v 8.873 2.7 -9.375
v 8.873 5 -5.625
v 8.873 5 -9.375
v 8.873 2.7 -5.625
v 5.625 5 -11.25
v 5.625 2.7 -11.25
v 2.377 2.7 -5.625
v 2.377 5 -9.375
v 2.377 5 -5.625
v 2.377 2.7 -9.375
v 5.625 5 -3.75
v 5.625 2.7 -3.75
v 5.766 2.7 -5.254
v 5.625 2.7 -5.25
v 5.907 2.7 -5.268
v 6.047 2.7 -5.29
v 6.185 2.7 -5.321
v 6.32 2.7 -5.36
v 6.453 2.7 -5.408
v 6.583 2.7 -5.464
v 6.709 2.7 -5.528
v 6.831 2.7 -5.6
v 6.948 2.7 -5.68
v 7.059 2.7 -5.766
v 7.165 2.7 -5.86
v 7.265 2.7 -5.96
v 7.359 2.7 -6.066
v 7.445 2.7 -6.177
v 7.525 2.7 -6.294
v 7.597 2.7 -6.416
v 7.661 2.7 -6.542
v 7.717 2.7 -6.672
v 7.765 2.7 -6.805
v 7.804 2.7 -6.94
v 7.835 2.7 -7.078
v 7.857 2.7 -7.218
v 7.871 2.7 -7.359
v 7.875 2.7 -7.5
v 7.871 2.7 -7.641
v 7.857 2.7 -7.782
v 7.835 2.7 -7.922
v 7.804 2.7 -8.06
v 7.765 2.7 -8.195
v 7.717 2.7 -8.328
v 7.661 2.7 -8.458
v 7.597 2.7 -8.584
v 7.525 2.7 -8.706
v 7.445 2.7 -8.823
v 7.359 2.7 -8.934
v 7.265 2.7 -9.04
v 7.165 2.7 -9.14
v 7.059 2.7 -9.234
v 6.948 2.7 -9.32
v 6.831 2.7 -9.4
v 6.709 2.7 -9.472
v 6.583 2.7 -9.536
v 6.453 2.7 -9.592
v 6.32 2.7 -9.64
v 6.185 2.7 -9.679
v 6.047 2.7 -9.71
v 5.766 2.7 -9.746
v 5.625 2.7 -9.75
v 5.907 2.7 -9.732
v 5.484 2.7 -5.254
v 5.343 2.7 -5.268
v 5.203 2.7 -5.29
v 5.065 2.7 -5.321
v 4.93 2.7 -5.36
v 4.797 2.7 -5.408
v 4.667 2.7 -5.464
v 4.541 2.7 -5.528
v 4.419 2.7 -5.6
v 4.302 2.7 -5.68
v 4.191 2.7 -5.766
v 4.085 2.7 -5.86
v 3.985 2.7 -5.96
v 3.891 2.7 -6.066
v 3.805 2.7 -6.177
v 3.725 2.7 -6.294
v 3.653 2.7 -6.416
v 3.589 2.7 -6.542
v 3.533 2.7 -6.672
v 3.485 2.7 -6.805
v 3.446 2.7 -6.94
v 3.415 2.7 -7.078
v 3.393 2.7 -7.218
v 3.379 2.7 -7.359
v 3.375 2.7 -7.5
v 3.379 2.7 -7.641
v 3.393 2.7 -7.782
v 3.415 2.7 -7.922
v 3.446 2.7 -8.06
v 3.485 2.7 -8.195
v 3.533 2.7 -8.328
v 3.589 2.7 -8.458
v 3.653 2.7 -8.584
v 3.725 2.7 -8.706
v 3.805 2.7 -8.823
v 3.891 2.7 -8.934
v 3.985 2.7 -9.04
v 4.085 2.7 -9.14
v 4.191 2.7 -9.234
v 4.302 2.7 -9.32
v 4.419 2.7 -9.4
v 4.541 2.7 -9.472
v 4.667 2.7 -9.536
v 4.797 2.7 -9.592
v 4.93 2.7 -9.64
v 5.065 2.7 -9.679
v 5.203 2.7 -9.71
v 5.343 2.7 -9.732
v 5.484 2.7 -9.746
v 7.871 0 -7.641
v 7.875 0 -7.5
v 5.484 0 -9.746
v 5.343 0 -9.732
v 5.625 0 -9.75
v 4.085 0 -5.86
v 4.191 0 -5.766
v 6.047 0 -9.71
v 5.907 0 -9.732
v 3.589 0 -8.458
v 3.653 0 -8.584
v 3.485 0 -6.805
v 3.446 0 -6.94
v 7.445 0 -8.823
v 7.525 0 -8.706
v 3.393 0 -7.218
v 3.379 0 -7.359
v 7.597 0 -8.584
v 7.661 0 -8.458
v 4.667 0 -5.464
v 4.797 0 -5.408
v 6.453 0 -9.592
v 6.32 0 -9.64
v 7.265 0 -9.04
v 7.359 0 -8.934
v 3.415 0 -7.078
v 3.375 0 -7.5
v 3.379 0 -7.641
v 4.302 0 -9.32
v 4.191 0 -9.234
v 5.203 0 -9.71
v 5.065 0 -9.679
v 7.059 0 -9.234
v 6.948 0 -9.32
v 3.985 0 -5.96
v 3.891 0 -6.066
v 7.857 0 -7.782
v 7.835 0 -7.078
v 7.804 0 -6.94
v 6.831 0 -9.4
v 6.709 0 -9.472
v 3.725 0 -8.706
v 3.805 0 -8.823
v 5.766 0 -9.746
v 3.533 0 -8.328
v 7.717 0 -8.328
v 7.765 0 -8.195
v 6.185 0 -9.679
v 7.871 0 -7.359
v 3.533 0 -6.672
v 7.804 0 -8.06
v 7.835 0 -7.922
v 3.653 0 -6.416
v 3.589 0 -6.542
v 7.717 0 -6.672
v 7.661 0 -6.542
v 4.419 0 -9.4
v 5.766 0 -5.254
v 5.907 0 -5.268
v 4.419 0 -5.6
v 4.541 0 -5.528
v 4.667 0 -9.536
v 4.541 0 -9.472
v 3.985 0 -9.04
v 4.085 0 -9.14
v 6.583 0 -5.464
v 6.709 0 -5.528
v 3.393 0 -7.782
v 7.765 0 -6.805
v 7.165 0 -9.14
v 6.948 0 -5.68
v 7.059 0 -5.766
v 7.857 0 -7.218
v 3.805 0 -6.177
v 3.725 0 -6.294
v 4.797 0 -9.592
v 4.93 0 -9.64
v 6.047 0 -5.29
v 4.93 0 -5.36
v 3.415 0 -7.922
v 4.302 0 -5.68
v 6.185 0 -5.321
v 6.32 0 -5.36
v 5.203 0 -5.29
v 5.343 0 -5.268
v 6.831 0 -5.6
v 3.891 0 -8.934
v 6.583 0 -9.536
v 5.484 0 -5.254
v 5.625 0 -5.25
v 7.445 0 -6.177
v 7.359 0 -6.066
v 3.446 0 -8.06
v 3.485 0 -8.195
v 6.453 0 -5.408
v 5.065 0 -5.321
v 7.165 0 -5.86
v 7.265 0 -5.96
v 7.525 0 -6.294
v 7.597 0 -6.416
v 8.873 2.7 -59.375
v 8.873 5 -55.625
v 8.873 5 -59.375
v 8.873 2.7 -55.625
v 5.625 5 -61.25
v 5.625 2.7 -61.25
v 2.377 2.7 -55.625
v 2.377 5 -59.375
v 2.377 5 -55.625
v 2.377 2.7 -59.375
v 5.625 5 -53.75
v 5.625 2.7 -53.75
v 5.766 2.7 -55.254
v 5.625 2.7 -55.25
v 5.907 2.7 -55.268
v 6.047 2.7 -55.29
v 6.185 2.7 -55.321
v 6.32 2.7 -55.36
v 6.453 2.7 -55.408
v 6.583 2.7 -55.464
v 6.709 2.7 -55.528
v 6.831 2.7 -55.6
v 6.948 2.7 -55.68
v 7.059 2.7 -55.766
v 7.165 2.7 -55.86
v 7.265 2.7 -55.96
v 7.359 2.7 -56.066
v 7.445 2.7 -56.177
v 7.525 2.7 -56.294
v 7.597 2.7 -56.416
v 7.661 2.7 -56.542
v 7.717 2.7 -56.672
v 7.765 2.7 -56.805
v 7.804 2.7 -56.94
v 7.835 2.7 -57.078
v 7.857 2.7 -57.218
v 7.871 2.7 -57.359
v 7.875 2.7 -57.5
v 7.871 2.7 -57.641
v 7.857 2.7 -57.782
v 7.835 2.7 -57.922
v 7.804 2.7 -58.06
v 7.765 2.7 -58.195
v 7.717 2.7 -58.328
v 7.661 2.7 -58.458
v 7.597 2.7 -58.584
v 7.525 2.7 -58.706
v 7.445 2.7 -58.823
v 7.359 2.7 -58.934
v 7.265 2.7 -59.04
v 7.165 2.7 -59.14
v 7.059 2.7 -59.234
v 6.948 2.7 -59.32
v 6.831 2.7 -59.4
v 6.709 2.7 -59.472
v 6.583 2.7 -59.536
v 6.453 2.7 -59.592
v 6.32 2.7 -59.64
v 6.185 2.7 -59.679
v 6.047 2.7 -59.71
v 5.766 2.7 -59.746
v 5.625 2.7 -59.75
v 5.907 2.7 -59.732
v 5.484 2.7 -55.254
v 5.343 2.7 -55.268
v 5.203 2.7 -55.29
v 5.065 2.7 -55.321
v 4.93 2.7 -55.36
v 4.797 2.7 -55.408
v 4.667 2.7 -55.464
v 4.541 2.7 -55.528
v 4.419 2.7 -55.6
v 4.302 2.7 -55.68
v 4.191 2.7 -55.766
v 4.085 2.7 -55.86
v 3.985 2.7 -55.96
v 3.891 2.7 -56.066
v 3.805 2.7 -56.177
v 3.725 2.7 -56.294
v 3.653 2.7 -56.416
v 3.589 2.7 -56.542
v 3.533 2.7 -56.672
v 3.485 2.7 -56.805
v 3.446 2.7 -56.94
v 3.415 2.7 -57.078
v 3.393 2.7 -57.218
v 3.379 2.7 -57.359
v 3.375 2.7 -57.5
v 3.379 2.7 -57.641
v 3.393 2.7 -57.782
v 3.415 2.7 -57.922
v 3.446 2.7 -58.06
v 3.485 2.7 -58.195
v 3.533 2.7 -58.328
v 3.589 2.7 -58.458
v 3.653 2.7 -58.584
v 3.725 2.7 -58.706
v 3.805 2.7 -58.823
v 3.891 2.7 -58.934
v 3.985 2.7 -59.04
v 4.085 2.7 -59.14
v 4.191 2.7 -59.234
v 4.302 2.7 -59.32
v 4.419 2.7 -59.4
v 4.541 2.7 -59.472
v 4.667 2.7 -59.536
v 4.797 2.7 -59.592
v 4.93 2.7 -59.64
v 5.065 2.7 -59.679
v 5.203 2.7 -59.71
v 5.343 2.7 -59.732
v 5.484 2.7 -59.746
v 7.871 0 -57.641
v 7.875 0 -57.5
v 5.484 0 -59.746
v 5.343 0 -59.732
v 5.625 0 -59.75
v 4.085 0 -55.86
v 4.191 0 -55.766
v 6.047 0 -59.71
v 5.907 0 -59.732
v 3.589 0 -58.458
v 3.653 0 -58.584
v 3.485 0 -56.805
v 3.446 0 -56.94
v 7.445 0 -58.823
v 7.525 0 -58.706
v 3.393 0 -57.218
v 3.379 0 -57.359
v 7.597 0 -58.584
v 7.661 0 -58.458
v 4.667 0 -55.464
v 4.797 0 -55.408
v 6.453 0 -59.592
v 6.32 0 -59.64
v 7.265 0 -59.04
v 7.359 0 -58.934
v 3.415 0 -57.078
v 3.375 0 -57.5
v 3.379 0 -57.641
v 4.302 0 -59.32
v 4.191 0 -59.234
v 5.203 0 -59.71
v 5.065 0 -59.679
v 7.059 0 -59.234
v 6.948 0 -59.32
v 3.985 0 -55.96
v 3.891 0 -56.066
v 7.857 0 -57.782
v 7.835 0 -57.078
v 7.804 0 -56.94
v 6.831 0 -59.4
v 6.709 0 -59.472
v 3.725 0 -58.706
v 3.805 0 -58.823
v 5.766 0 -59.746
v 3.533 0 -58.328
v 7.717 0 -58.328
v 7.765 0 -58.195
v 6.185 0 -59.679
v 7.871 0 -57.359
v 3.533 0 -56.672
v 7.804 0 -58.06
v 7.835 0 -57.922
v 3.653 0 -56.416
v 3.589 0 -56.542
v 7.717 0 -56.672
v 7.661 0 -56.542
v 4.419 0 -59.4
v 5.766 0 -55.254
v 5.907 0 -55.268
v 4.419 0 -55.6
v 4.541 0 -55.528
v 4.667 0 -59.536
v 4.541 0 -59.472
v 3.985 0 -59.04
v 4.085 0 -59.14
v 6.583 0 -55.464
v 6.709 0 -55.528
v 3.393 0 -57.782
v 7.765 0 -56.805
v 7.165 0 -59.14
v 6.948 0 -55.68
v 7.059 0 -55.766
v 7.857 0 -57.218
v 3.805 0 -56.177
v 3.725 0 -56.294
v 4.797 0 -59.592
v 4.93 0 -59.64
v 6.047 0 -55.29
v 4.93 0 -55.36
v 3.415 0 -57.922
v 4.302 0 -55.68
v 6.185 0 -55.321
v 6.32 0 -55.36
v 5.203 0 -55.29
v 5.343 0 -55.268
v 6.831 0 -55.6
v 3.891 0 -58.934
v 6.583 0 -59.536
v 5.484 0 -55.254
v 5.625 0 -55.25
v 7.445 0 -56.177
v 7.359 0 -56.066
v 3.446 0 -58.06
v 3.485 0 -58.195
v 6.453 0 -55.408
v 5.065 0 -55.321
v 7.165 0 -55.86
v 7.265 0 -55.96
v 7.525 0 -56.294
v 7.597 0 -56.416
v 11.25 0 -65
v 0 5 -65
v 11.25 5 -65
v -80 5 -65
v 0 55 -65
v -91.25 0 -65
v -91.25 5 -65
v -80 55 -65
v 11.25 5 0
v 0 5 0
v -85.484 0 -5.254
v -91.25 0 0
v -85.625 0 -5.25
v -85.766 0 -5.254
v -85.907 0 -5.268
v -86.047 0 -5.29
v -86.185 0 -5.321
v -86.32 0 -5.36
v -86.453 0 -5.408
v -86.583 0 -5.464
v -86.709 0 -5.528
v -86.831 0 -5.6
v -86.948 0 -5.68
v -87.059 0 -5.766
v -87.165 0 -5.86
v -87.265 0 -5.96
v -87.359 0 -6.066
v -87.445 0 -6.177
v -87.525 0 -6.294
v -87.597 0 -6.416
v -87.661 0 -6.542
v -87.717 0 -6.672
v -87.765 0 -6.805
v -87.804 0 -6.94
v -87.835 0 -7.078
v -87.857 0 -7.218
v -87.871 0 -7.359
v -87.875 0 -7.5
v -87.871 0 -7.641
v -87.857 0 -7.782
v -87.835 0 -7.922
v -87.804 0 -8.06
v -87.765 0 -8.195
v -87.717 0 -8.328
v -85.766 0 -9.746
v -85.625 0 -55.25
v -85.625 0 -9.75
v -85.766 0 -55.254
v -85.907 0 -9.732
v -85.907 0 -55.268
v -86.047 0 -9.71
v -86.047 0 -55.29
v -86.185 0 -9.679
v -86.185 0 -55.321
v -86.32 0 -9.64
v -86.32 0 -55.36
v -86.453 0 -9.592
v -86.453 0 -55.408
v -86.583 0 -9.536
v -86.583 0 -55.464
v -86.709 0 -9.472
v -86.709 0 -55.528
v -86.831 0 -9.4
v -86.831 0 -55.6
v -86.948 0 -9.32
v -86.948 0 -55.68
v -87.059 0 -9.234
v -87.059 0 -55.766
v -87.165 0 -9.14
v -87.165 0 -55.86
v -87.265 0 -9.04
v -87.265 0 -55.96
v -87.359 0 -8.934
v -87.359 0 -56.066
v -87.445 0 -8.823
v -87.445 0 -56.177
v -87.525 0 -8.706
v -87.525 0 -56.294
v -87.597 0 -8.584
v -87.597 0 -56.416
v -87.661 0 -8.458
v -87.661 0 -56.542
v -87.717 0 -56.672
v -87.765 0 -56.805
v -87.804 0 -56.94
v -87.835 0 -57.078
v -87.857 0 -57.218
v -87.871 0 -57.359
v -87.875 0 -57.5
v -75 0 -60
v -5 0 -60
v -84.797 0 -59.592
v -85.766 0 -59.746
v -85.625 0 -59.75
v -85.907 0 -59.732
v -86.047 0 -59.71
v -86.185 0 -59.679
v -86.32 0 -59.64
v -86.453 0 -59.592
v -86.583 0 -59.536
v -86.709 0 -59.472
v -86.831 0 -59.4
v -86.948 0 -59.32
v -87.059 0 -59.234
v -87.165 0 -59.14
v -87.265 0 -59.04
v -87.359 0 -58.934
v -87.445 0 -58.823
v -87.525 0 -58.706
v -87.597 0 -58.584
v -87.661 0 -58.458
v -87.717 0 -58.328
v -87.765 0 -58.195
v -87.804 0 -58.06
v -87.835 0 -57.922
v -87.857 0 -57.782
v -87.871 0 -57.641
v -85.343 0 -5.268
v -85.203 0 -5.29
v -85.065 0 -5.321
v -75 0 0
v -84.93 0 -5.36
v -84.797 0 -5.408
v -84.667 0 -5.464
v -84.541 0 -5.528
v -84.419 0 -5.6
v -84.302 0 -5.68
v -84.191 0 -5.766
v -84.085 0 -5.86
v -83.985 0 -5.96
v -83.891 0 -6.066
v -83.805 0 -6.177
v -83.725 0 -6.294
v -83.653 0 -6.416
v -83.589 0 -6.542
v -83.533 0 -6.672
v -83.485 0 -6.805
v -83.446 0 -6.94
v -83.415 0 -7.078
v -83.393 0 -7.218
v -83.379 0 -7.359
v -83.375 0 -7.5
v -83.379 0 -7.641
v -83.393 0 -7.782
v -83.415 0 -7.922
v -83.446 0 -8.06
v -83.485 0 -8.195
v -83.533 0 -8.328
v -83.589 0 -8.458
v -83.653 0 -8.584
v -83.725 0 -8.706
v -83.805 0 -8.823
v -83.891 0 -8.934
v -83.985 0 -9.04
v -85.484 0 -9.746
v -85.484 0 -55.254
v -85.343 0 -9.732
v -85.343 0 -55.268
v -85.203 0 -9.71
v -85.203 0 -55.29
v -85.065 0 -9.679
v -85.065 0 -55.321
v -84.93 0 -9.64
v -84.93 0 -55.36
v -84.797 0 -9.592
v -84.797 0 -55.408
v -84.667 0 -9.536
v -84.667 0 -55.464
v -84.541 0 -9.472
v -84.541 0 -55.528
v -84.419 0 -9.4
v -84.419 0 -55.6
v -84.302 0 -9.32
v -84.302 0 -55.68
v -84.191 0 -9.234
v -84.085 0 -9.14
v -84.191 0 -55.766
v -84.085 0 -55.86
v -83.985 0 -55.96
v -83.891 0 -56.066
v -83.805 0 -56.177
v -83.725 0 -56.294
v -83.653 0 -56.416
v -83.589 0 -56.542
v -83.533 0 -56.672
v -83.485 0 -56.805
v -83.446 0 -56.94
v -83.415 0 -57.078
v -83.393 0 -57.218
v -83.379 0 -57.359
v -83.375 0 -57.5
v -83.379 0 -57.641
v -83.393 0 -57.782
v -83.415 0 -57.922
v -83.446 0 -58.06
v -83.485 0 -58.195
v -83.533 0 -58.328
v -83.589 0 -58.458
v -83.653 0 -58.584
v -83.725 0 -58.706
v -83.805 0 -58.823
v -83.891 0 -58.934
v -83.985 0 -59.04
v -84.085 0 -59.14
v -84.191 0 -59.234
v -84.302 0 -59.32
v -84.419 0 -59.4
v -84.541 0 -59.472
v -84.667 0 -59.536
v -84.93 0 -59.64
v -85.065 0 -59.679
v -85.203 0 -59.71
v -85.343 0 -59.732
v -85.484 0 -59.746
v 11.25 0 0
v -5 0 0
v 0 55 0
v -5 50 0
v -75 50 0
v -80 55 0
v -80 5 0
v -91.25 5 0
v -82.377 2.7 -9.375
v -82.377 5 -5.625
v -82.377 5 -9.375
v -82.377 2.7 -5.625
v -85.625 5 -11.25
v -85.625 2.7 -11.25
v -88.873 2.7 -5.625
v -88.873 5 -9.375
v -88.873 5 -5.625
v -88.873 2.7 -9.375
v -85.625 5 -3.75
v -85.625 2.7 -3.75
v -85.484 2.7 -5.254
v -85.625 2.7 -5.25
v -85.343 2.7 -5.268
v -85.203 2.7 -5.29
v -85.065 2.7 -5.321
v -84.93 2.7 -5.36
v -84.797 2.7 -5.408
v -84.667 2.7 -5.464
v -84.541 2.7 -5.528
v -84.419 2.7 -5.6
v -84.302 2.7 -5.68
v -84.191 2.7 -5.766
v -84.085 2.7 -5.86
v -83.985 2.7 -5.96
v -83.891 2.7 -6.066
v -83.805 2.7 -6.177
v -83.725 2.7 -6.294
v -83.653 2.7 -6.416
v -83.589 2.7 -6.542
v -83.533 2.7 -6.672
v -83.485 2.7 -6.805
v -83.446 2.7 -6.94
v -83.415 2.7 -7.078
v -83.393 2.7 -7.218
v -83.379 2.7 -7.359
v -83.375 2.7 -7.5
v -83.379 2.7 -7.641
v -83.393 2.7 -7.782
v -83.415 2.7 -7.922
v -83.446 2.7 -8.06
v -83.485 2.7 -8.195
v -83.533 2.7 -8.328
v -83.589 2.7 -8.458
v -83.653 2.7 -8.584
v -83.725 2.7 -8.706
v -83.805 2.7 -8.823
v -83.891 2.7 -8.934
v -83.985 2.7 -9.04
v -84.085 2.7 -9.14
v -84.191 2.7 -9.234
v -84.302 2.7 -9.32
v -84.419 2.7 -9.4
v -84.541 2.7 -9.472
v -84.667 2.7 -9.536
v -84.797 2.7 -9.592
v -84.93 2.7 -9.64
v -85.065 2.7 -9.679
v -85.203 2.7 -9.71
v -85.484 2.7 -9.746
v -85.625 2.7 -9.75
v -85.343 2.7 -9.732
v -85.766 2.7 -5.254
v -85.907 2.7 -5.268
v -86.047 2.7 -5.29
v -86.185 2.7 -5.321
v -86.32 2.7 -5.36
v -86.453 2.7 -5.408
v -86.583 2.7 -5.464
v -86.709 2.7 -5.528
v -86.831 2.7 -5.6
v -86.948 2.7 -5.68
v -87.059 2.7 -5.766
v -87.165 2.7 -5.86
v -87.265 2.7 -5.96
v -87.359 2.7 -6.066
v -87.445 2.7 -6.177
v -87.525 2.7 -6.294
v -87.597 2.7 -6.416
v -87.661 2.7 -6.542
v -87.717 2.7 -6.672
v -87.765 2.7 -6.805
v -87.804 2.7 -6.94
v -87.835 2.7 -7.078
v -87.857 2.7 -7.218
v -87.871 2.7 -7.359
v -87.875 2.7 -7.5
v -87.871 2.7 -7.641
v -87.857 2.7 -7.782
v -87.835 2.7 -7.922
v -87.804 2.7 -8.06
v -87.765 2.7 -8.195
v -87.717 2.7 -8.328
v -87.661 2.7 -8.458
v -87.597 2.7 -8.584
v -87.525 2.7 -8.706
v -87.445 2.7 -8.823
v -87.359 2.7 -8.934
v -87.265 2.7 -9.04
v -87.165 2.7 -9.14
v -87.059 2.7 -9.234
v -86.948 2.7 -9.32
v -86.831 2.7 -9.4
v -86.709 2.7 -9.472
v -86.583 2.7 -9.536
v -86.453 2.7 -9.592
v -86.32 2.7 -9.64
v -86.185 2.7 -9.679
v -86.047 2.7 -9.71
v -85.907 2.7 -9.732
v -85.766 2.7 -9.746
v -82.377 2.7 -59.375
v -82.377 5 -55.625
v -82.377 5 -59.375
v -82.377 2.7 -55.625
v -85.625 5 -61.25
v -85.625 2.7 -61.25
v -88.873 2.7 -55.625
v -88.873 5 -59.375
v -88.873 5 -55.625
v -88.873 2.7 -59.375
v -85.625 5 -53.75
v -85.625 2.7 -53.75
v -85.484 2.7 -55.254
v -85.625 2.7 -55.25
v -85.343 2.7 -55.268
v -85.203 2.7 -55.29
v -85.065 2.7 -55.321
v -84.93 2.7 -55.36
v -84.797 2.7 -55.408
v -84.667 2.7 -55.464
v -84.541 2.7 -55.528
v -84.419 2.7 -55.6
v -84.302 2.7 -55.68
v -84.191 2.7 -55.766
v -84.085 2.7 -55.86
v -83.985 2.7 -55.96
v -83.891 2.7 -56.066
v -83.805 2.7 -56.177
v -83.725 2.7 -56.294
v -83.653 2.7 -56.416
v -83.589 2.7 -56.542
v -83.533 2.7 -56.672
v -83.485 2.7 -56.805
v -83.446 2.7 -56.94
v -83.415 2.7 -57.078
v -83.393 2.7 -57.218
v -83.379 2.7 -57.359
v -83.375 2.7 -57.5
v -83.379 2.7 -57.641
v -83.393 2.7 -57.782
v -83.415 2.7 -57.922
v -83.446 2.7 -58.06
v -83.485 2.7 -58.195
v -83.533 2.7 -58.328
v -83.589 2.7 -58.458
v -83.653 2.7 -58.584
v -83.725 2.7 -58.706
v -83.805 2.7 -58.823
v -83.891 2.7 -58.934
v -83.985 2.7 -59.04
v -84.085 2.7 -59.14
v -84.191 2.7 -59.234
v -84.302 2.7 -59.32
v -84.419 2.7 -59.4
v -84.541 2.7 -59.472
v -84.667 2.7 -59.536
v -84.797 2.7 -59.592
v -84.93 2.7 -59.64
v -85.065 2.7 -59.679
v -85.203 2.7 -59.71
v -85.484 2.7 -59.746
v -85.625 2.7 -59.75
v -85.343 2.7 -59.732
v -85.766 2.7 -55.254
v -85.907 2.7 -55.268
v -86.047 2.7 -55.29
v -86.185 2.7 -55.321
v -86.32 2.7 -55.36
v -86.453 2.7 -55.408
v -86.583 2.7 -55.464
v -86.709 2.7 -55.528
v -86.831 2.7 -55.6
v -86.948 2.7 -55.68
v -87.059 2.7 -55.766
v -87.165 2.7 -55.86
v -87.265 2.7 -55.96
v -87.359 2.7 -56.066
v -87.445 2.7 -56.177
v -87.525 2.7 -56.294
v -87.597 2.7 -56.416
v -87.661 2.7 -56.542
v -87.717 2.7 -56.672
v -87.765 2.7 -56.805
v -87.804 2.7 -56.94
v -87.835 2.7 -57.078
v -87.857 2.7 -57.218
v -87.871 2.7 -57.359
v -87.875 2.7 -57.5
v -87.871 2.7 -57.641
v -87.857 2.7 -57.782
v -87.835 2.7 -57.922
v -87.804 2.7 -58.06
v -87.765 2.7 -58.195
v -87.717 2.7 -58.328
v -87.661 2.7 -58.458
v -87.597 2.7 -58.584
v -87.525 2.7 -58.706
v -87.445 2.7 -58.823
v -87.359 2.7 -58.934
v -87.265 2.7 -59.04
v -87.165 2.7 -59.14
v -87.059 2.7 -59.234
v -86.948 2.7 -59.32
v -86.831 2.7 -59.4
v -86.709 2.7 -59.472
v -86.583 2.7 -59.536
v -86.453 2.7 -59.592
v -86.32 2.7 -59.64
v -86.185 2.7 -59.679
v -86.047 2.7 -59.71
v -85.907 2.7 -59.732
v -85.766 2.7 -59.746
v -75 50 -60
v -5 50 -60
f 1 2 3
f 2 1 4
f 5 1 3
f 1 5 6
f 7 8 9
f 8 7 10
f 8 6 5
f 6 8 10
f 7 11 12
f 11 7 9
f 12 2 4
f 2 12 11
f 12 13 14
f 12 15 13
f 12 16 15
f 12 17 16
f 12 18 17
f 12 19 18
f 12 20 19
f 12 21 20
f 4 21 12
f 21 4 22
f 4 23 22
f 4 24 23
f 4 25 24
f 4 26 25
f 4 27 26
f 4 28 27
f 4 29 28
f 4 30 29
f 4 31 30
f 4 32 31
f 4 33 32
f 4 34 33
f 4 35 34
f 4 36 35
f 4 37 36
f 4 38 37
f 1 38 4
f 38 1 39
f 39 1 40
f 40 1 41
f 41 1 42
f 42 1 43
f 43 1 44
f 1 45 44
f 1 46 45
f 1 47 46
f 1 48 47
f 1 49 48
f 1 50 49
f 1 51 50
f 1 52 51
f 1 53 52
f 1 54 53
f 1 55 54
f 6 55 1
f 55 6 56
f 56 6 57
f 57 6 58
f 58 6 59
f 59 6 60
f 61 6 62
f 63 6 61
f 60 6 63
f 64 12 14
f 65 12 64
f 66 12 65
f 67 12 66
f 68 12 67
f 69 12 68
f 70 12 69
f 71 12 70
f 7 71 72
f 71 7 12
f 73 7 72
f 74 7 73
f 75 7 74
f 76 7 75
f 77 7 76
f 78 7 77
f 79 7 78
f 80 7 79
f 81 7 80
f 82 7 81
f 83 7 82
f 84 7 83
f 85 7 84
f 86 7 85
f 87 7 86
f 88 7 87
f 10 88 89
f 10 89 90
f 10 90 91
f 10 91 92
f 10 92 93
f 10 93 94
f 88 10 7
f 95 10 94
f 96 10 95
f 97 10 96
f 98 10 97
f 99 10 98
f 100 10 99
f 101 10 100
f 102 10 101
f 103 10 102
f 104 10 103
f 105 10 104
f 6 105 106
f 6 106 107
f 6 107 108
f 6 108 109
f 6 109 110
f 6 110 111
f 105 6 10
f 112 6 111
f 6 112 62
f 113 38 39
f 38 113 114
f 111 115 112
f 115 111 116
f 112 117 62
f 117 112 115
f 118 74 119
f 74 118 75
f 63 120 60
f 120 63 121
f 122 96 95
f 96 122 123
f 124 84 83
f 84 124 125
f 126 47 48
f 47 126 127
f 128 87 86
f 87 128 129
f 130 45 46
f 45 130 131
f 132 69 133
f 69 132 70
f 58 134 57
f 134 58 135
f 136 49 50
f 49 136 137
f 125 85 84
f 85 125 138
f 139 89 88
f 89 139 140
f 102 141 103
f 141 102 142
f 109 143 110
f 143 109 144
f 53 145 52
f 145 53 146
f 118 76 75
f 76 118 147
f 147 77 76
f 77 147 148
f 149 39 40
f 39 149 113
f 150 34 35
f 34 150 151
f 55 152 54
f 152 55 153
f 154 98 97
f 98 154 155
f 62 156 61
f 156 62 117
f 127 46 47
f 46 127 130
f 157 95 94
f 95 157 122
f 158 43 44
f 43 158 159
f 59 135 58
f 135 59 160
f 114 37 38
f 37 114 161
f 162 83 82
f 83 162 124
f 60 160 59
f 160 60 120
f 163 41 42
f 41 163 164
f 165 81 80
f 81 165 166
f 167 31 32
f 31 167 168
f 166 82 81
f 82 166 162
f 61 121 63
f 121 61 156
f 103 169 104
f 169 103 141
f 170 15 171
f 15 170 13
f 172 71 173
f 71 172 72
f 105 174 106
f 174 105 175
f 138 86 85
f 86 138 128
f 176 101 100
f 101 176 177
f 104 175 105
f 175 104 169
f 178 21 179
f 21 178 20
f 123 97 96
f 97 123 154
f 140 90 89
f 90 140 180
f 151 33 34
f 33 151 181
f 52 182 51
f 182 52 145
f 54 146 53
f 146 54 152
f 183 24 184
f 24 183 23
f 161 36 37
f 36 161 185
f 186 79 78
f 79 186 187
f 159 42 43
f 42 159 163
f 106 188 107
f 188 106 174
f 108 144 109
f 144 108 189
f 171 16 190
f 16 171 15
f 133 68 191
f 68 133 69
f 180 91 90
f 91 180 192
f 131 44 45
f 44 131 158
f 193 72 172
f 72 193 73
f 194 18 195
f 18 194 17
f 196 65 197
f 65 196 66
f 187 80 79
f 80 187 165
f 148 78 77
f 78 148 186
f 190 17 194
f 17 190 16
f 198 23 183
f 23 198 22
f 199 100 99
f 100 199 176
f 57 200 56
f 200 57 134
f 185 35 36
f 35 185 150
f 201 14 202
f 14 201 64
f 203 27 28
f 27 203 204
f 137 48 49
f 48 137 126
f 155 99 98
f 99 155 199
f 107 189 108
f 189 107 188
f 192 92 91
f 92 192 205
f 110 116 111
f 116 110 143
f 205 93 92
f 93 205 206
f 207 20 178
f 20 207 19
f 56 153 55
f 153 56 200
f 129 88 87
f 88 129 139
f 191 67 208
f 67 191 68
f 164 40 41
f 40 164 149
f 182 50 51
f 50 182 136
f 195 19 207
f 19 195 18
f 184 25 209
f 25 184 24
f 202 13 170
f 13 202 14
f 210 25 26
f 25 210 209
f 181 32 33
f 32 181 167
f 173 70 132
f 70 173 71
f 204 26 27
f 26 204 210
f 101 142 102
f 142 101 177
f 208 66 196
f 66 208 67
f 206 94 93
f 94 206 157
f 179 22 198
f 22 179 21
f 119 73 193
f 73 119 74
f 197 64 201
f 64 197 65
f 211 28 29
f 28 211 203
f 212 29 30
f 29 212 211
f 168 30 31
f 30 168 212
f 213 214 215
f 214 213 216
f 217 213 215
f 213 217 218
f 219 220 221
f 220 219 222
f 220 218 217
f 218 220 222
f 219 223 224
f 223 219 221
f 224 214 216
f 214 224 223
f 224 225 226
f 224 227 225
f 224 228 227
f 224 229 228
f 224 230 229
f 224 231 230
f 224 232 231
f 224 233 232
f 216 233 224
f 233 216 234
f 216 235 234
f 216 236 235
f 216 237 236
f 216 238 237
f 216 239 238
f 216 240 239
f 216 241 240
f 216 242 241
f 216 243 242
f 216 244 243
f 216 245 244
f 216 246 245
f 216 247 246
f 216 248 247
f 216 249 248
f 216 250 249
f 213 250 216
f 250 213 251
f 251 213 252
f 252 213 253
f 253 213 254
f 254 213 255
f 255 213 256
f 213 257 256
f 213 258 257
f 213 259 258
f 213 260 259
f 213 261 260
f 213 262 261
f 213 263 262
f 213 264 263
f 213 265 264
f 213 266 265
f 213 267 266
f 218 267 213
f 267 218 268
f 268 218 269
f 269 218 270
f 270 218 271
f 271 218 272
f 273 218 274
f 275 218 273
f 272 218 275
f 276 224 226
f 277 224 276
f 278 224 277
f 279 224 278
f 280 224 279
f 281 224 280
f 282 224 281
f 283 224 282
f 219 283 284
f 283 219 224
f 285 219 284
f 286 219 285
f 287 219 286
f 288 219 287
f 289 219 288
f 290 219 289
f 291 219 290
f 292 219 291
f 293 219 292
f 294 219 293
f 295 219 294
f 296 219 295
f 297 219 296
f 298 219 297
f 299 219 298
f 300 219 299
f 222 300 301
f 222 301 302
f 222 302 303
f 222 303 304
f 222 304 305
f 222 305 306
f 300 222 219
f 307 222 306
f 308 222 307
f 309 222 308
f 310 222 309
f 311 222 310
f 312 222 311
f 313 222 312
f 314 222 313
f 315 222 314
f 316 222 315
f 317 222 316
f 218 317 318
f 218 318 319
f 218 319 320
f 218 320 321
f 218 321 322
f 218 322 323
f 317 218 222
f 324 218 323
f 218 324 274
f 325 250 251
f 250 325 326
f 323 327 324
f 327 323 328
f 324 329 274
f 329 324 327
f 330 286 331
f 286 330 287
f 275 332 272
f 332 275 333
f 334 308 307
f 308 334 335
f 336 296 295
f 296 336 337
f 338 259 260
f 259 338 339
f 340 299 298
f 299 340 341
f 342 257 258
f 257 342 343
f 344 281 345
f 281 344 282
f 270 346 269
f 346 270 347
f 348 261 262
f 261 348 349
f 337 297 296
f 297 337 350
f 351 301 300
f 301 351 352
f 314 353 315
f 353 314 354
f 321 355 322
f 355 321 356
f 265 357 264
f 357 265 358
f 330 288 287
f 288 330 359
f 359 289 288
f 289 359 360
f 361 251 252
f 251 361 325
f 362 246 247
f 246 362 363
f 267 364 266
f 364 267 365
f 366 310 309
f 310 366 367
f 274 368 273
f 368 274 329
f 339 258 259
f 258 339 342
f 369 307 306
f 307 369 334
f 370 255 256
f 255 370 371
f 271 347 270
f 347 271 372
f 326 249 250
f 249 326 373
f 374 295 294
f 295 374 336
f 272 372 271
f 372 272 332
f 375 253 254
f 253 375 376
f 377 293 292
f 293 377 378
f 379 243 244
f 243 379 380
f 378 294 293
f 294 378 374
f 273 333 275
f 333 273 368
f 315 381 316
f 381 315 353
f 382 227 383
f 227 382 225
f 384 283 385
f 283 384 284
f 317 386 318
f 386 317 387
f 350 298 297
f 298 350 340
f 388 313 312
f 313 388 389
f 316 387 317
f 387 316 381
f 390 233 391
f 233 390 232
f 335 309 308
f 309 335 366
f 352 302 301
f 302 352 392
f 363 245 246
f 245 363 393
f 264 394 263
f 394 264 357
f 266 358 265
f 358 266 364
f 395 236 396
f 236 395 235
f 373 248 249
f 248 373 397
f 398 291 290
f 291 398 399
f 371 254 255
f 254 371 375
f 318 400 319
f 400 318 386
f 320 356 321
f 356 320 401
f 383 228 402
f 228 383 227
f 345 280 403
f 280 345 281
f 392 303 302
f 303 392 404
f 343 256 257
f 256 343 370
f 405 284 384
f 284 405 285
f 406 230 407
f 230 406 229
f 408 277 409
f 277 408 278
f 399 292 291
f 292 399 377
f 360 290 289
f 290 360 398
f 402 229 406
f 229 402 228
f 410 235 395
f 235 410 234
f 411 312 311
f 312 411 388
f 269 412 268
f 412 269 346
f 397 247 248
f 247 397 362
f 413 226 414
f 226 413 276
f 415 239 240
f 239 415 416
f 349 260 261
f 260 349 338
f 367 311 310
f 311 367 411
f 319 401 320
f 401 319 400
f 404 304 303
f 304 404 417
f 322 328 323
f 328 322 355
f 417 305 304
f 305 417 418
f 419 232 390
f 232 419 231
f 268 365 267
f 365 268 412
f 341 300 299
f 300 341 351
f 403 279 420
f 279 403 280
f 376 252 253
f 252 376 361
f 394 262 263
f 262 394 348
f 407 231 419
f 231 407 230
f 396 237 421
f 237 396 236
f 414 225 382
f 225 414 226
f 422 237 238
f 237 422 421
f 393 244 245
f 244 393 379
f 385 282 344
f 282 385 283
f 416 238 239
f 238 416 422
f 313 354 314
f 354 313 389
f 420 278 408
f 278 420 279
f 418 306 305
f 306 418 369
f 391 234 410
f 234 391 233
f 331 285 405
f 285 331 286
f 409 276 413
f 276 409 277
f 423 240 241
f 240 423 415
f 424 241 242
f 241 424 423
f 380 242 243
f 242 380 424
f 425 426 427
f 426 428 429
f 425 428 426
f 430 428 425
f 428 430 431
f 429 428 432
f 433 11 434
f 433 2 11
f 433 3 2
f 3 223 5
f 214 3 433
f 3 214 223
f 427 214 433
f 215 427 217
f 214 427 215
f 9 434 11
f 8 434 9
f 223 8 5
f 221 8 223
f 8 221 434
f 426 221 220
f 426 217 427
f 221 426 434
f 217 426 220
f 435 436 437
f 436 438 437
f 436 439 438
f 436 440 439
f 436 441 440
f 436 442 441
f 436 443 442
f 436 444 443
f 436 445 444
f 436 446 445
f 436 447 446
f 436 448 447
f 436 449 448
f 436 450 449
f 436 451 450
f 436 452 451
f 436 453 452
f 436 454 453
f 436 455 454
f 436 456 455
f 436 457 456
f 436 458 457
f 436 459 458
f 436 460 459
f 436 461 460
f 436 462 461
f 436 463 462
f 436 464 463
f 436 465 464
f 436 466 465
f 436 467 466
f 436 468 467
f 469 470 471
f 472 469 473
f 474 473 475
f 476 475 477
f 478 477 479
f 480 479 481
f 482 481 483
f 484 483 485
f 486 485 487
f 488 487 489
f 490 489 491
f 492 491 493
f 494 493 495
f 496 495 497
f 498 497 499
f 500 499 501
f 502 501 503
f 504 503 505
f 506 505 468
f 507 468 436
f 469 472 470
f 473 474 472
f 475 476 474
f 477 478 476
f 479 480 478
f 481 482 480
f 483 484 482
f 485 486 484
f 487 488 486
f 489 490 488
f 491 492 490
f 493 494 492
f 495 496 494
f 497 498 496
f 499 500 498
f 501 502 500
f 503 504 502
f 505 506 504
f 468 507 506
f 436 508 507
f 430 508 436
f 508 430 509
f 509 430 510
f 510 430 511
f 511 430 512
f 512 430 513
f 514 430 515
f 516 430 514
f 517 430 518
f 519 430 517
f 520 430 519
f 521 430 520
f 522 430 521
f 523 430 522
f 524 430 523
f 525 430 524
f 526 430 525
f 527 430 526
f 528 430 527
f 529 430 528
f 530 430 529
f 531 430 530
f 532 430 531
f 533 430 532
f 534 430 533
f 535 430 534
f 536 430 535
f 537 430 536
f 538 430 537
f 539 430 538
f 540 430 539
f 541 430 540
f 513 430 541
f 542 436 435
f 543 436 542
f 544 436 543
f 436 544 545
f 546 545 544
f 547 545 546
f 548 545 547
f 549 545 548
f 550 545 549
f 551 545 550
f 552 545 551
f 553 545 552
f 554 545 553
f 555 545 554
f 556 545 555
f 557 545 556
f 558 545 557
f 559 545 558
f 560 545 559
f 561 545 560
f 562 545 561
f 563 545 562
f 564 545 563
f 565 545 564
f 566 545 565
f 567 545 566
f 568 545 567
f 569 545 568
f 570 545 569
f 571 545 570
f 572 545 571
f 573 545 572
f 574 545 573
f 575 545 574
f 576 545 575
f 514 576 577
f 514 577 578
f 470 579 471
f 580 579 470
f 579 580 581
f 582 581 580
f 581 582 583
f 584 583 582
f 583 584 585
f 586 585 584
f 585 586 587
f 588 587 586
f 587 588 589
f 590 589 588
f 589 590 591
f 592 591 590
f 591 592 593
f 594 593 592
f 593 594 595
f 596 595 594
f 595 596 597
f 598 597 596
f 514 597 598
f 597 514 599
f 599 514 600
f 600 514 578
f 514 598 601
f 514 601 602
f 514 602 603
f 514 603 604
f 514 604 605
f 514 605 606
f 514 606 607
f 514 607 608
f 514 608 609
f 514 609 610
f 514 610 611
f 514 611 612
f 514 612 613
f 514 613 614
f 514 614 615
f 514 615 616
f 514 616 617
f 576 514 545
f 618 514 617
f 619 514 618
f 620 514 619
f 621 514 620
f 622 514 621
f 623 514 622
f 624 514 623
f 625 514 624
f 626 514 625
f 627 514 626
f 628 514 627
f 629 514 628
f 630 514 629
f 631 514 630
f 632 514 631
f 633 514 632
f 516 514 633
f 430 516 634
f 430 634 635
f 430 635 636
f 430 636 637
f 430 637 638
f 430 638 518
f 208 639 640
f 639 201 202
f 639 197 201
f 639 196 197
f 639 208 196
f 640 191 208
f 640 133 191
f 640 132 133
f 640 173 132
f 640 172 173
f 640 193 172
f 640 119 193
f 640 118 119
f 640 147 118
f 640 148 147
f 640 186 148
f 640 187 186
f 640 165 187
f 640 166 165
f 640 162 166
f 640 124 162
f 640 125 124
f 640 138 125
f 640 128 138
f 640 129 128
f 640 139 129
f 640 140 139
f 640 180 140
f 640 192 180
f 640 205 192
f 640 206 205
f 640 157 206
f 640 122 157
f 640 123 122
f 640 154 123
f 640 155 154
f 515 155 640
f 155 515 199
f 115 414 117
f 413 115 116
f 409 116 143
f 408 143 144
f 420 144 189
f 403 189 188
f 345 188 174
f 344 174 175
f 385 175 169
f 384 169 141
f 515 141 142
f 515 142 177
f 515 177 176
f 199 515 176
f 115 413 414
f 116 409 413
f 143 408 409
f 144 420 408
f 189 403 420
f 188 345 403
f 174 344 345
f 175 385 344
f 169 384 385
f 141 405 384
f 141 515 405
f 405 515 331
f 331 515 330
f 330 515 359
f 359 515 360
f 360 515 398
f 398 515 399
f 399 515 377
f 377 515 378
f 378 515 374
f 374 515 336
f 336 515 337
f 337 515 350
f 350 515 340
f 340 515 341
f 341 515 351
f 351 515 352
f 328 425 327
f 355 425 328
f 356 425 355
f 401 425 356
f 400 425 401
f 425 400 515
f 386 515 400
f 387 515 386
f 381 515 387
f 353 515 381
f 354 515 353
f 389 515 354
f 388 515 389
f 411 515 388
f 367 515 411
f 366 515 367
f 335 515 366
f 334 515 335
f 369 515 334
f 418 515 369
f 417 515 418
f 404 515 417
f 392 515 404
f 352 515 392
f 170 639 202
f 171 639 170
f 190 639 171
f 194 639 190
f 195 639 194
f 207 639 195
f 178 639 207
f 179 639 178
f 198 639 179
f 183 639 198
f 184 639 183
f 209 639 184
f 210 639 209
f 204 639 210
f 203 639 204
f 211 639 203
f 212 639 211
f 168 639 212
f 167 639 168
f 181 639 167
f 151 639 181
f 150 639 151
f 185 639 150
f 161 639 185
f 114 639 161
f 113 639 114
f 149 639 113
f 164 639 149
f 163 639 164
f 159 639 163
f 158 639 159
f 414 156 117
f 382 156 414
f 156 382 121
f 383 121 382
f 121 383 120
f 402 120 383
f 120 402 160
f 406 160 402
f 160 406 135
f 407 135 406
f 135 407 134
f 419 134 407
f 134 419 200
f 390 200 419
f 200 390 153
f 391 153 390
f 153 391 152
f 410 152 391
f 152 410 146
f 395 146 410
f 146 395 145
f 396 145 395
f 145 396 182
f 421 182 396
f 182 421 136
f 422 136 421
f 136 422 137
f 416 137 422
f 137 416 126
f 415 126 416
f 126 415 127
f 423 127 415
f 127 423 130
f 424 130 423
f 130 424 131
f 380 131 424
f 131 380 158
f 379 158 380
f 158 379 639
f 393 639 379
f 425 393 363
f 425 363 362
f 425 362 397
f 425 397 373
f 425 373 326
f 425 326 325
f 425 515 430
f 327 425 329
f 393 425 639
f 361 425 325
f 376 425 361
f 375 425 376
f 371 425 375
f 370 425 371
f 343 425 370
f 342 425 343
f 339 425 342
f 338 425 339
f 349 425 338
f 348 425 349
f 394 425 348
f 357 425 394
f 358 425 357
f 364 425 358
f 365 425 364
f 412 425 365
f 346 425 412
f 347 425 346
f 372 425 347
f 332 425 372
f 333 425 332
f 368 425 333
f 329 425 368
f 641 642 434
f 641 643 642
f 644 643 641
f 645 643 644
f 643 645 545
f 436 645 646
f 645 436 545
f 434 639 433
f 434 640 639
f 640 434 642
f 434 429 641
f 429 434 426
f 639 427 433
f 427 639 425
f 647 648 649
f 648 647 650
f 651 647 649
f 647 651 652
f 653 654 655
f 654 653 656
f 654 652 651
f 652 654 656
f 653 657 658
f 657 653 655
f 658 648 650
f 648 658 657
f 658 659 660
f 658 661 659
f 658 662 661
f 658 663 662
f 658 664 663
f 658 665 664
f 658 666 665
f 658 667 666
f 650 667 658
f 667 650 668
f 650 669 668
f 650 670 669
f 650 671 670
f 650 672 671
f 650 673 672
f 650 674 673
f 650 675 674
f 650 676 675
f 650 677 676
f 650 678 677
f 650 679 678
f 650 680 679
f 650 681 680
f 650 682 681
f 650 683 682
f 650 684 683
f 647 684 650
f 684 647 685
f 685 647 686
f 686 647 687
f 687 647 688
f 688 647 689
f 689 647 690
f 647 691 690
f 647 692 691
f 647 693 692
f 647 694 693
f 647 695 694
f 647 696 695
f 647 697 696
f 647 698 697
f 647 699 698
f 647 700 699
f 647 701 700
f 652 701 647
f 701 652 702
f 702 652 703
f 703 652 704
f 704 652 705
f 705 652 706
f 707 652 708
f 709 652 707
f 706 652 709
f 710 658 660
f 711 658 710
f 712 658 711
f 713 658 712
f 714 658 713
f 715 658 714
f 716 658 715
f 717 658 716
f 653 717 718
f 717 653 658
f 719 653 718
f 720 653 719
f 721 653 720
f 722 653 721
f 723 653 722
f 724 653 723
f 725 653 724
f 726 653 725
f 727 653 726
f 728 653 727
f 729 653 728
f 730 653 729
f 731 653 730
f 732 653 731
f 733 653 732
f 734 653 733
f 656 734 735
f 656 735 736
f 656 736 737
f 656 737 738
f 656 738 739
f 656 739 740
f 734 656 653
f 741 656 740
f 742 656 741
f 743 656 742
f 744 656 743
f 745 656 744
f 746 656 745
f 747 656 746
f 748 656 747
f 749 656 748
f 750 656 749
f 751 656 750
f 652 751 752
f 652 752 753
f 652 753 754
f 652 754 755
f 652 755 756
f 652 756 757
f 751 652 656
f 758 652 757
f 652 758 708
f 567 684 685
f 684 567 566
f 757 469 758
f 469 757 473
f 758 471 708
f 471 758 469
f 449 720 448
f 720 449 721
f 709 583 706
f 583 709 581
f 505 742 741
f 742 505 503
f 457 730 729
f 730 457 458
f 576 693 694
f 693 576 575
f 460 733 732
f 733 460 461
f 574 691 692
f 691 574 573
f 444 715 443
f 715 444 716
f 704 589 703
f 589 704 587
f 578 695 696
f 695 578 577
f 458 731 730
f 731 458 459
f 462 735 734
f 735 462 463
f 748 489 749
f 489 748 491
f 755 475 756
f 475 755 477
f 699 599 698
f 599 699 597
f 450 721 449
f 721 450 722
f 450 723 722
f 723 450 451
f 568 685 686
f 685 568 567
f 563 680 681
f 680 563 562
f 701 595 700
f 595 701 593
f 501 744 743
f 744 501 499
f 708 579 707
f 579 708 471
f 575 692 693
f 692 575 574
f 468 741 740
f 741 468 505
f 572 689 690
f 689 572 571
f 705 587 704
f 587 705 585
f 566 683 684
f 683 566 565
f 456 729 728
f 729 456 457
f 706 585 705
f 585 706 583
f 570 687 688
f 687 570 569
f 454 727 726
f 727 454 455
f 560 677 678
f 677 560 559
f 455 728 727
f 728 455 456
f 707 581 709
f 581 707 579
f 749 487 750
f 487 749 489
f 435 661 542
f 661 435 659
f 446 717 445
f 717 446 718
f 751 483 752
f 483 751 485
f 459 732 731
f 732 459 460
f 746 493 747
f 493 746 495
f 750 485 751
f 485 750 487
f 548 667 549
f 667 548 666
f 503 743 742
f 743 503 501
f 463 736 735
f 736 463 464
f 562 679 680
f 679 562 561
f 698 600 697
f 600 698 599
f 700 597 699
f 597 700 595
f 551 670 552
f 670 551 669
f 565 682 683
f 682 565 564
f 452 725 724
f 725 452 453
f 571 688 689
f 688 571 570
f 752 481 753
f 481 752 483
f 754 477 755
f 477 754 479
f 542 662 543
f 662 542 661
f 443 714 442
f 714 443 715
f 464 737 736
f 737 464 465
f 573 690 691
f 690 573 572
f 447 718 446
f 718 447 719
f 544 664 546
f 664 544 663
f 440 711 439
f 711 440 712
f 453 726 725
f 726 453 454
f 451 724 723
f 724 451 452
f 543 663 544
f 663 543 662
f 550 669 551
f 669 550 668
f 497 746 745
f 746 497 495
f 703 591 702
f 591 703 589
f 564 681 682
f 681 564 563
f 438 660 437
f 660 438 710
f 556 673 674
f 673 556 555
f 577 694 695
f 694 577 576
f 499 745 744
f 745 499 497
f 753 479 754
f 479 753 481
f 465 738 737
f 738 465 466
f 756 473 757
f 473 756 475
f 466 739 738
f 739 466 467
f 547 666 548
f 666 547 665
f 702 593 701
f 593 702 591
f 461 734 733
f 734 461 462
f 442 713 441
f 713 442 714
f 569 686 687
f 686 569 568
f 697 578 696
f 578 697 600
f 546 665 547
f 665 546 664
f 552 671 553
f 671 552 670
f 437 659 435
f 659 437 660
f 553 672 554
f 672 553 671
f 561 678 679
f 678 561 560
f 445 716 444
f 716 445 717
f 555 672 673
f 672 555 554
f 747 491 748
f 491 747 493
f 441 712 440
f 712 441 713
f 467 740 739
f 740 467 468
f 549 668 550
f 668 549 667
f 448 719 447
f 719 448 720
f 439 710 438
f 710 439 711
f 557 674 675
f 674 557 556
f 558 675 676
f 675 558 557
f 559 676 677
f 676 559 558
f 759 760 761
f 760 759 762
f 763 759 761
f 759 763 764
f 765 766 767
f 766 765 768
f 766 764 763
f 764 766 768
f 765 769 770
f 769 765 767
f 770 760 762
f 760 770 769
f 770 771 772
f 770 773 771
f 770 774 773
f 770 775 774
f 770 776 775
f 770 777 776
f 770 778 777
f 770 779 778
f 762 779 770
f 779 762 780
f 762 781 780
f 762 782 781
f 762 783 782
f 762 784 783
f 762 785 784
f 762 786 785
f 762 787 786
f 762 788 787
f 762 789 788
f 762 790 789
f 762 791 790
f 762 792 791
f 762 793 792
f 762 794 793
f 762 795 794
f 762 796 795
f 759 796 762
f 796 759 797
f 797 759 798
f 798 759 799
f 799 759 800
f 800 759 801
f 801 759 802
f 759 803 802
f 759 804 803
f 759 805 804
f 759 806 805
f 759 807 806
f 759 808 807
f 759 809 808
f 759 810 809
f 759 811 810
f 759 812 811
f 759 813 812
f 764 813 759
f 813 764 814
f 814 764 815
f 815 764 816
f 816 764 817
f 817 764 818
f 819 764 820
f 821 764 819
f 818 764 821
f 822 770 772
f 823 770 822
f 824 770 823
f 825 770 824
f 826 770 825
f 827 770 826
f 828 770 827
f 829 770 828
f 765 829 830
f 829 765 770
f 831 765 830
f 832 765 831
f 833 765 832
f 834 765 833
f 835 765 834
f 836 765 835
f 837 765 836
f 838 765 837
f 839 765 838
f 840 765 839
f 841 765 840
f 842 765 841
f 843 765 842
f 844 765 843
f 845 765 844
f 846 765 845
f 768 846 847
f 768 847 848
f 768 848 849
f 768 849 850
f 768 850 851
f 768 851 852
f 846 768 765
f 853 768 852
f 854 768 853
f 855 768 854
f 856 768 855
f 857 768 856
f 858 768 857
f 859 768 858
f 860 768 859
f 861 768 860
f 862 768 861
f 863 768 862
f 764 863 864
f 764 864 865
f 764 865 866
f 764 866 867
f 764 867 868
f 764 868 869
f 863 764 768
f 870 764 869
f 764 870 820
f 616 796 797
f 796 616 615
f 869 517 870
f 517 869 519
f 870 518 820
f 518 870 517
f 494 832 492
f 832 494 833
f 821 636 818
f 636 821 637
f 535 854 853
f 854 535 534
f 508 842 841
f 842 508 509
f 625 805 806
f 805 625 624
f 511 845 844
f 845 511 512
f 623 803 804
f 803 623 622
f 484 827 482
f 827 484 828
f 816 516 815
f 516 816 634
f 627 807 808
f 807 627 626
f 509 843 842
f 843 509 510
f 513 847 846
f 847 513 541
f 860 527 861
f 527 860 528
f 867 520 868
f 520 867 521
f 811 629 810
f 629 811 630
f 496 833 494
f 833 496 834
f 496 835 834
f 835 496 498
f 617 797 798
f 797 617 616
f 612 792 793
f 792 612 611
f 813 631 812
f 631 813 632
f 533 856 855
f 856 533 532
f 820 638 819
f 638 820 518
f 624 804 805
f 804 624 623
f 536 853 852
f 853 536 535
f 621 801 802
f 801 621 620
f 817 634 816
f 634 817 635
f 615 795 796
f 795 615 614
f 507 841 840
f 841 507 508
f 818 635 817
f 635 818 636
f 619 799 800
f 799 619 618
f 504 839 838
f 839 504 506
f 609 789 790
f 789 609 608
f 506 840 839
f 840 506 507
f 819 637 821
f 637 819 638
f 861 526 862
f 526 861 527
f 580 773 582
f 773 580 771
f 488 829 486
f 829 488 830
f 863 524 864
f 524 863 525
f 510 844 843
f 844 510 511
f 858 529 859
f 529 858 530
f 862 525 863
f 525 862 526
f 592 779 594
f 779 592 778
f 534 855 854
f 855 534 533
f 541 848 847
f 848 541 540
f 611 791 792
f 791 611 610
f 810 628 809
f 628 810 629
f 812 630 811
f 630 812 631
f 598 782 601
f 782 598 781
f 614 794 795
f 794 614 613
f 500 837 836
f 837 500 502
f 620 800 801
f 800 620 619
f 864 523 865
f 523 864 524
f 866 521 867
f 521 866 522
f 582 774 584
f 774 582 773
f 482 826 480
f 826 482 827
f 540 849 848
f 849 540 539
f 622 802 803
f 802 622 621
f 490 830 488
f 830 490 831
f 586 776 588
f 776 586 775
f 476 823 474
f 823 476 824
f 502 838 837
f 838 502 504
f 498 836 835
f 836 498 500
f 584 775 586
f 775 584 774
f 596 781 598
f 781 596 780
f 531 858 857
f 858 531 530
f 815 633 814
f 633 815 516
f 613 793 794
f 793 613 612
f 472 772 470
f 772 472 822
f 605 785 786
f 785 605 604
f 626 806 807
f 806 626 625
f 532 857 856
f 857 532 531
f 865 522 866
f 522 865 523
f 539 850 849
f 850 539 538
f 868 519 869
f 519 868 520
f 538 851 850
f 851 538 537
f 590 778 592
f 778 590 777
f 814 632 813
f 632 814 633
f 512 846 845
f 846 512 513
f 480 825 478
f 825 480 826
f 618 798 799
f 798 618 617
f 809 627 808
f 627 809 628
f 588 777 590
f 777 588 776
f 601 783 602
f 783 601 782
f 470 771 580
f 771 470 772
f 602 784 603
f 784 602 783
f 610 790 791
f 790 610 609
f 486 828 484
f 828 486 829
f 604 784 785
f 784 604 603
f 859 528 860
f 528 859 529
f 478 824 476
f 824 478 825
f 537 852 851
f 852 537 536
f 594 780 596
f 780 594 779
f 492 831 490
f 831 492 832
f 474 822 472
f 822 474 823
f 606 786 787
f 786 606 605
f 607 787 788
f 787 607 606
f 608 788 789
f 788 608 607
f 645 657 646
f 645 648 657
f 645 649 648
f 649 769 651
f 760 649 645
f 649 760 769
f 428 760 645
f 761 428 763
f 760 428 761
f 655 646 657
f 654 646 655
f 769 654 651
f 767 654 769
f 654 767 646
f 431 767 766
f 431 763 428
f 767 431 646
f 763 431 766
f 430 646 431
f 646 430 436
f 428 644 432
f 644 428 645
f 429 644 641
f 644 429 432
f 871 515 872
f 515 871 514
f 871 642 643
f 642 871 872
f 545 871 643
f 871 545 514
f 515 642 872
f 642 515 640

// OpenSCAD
// Flush holder
// Copyright (C) 2016  Andre-Patrick Bubel <code@andre-bubel.de>
//
// This program is free software: you can redistribute it and/or modify
// it under the terms of the GNU General Public License as published by
// the Free Software Foundation, either version 3 of the License, or
// (at your option) any later version.
// 
// This program is distributed in the hope that it will be useful,
// but WITHOUT ANY WARRANTY; without even the implied warranty of
// MERCHANTABILITY or FITNESS FOR A PARTICULAR PURPOSE.  See the
// GNU General Public License for more details.
// 
// You should have received a copy of the GNU General Public License
// along with this program.  If not, see <http://www.gnu.org/licenses/>.
//
// This work is also licensed under a Creative Commons
// Attribution-ShareAlike 4.0 International License.

screw_hole_diameter = 4.5;

nut_width = 7.5;
nut_height = 3.2;

layer_height = 0.3;

case_inner_width = 60;
case_inner_height = 50;
case_inner_length = 70;

wall_thickness = 5;
fastening_plate_height = 5;

/* [Hidden] */
// how much puncher parts should overlap to avoid zero thickness leftovers
punch = 1000;

case_inner_dim_punch = [case_inner_width+punch, case_inner_length, case_inner_height+punch];

case_outer_width = case_inner_width + wall_thickness;
case_outer_height = case_inner_height + wall_thickness;
case_outer_length = case_inner_length + 2*wall_thickness;

case_outer_dim = [case_outer_width, case_outer_length, case_outer_height];

fastening_plate_length = 3/2 * nut_width;
fastening_plate_width = case_outer_width;
fastening_plate_height = nut_height + layer_height * 6;

fastening_plate_dim = [fastening_plate_width, fastening_plate_length, fastening_plate_height];

module hole_puncher() {
    union() {
        cylinder(punch, d = nut_width, $fn=6);
        translate([0,0,-punch+1])
        cylinder(punch, d = screw_hole_diameter);
    }
}

module fastening_plate() {
    difference() {
        cube(fastening_plate_dim);
        translate([nut_width, fastening_plate_length/2, layer_height * 9])
        hole_puncher();
        translate([fastening_plate_width - nut_width, fastening_plate_length/2, layer_height * 9])
        hole_puncher();        
    }
};

$fn = 100;

rotate([0,90,90])
difference() {
    union() {
        translate([0,-fastening_plate_length,0])
        fastening_plate();
        translate([0,case_outer_length,0])
        fastening_plate();    
        cube(case_outer_dim);
    }
    translate([-punch, wall_thickness, -punch])
    cube(case_inner_dim_punch);
}
